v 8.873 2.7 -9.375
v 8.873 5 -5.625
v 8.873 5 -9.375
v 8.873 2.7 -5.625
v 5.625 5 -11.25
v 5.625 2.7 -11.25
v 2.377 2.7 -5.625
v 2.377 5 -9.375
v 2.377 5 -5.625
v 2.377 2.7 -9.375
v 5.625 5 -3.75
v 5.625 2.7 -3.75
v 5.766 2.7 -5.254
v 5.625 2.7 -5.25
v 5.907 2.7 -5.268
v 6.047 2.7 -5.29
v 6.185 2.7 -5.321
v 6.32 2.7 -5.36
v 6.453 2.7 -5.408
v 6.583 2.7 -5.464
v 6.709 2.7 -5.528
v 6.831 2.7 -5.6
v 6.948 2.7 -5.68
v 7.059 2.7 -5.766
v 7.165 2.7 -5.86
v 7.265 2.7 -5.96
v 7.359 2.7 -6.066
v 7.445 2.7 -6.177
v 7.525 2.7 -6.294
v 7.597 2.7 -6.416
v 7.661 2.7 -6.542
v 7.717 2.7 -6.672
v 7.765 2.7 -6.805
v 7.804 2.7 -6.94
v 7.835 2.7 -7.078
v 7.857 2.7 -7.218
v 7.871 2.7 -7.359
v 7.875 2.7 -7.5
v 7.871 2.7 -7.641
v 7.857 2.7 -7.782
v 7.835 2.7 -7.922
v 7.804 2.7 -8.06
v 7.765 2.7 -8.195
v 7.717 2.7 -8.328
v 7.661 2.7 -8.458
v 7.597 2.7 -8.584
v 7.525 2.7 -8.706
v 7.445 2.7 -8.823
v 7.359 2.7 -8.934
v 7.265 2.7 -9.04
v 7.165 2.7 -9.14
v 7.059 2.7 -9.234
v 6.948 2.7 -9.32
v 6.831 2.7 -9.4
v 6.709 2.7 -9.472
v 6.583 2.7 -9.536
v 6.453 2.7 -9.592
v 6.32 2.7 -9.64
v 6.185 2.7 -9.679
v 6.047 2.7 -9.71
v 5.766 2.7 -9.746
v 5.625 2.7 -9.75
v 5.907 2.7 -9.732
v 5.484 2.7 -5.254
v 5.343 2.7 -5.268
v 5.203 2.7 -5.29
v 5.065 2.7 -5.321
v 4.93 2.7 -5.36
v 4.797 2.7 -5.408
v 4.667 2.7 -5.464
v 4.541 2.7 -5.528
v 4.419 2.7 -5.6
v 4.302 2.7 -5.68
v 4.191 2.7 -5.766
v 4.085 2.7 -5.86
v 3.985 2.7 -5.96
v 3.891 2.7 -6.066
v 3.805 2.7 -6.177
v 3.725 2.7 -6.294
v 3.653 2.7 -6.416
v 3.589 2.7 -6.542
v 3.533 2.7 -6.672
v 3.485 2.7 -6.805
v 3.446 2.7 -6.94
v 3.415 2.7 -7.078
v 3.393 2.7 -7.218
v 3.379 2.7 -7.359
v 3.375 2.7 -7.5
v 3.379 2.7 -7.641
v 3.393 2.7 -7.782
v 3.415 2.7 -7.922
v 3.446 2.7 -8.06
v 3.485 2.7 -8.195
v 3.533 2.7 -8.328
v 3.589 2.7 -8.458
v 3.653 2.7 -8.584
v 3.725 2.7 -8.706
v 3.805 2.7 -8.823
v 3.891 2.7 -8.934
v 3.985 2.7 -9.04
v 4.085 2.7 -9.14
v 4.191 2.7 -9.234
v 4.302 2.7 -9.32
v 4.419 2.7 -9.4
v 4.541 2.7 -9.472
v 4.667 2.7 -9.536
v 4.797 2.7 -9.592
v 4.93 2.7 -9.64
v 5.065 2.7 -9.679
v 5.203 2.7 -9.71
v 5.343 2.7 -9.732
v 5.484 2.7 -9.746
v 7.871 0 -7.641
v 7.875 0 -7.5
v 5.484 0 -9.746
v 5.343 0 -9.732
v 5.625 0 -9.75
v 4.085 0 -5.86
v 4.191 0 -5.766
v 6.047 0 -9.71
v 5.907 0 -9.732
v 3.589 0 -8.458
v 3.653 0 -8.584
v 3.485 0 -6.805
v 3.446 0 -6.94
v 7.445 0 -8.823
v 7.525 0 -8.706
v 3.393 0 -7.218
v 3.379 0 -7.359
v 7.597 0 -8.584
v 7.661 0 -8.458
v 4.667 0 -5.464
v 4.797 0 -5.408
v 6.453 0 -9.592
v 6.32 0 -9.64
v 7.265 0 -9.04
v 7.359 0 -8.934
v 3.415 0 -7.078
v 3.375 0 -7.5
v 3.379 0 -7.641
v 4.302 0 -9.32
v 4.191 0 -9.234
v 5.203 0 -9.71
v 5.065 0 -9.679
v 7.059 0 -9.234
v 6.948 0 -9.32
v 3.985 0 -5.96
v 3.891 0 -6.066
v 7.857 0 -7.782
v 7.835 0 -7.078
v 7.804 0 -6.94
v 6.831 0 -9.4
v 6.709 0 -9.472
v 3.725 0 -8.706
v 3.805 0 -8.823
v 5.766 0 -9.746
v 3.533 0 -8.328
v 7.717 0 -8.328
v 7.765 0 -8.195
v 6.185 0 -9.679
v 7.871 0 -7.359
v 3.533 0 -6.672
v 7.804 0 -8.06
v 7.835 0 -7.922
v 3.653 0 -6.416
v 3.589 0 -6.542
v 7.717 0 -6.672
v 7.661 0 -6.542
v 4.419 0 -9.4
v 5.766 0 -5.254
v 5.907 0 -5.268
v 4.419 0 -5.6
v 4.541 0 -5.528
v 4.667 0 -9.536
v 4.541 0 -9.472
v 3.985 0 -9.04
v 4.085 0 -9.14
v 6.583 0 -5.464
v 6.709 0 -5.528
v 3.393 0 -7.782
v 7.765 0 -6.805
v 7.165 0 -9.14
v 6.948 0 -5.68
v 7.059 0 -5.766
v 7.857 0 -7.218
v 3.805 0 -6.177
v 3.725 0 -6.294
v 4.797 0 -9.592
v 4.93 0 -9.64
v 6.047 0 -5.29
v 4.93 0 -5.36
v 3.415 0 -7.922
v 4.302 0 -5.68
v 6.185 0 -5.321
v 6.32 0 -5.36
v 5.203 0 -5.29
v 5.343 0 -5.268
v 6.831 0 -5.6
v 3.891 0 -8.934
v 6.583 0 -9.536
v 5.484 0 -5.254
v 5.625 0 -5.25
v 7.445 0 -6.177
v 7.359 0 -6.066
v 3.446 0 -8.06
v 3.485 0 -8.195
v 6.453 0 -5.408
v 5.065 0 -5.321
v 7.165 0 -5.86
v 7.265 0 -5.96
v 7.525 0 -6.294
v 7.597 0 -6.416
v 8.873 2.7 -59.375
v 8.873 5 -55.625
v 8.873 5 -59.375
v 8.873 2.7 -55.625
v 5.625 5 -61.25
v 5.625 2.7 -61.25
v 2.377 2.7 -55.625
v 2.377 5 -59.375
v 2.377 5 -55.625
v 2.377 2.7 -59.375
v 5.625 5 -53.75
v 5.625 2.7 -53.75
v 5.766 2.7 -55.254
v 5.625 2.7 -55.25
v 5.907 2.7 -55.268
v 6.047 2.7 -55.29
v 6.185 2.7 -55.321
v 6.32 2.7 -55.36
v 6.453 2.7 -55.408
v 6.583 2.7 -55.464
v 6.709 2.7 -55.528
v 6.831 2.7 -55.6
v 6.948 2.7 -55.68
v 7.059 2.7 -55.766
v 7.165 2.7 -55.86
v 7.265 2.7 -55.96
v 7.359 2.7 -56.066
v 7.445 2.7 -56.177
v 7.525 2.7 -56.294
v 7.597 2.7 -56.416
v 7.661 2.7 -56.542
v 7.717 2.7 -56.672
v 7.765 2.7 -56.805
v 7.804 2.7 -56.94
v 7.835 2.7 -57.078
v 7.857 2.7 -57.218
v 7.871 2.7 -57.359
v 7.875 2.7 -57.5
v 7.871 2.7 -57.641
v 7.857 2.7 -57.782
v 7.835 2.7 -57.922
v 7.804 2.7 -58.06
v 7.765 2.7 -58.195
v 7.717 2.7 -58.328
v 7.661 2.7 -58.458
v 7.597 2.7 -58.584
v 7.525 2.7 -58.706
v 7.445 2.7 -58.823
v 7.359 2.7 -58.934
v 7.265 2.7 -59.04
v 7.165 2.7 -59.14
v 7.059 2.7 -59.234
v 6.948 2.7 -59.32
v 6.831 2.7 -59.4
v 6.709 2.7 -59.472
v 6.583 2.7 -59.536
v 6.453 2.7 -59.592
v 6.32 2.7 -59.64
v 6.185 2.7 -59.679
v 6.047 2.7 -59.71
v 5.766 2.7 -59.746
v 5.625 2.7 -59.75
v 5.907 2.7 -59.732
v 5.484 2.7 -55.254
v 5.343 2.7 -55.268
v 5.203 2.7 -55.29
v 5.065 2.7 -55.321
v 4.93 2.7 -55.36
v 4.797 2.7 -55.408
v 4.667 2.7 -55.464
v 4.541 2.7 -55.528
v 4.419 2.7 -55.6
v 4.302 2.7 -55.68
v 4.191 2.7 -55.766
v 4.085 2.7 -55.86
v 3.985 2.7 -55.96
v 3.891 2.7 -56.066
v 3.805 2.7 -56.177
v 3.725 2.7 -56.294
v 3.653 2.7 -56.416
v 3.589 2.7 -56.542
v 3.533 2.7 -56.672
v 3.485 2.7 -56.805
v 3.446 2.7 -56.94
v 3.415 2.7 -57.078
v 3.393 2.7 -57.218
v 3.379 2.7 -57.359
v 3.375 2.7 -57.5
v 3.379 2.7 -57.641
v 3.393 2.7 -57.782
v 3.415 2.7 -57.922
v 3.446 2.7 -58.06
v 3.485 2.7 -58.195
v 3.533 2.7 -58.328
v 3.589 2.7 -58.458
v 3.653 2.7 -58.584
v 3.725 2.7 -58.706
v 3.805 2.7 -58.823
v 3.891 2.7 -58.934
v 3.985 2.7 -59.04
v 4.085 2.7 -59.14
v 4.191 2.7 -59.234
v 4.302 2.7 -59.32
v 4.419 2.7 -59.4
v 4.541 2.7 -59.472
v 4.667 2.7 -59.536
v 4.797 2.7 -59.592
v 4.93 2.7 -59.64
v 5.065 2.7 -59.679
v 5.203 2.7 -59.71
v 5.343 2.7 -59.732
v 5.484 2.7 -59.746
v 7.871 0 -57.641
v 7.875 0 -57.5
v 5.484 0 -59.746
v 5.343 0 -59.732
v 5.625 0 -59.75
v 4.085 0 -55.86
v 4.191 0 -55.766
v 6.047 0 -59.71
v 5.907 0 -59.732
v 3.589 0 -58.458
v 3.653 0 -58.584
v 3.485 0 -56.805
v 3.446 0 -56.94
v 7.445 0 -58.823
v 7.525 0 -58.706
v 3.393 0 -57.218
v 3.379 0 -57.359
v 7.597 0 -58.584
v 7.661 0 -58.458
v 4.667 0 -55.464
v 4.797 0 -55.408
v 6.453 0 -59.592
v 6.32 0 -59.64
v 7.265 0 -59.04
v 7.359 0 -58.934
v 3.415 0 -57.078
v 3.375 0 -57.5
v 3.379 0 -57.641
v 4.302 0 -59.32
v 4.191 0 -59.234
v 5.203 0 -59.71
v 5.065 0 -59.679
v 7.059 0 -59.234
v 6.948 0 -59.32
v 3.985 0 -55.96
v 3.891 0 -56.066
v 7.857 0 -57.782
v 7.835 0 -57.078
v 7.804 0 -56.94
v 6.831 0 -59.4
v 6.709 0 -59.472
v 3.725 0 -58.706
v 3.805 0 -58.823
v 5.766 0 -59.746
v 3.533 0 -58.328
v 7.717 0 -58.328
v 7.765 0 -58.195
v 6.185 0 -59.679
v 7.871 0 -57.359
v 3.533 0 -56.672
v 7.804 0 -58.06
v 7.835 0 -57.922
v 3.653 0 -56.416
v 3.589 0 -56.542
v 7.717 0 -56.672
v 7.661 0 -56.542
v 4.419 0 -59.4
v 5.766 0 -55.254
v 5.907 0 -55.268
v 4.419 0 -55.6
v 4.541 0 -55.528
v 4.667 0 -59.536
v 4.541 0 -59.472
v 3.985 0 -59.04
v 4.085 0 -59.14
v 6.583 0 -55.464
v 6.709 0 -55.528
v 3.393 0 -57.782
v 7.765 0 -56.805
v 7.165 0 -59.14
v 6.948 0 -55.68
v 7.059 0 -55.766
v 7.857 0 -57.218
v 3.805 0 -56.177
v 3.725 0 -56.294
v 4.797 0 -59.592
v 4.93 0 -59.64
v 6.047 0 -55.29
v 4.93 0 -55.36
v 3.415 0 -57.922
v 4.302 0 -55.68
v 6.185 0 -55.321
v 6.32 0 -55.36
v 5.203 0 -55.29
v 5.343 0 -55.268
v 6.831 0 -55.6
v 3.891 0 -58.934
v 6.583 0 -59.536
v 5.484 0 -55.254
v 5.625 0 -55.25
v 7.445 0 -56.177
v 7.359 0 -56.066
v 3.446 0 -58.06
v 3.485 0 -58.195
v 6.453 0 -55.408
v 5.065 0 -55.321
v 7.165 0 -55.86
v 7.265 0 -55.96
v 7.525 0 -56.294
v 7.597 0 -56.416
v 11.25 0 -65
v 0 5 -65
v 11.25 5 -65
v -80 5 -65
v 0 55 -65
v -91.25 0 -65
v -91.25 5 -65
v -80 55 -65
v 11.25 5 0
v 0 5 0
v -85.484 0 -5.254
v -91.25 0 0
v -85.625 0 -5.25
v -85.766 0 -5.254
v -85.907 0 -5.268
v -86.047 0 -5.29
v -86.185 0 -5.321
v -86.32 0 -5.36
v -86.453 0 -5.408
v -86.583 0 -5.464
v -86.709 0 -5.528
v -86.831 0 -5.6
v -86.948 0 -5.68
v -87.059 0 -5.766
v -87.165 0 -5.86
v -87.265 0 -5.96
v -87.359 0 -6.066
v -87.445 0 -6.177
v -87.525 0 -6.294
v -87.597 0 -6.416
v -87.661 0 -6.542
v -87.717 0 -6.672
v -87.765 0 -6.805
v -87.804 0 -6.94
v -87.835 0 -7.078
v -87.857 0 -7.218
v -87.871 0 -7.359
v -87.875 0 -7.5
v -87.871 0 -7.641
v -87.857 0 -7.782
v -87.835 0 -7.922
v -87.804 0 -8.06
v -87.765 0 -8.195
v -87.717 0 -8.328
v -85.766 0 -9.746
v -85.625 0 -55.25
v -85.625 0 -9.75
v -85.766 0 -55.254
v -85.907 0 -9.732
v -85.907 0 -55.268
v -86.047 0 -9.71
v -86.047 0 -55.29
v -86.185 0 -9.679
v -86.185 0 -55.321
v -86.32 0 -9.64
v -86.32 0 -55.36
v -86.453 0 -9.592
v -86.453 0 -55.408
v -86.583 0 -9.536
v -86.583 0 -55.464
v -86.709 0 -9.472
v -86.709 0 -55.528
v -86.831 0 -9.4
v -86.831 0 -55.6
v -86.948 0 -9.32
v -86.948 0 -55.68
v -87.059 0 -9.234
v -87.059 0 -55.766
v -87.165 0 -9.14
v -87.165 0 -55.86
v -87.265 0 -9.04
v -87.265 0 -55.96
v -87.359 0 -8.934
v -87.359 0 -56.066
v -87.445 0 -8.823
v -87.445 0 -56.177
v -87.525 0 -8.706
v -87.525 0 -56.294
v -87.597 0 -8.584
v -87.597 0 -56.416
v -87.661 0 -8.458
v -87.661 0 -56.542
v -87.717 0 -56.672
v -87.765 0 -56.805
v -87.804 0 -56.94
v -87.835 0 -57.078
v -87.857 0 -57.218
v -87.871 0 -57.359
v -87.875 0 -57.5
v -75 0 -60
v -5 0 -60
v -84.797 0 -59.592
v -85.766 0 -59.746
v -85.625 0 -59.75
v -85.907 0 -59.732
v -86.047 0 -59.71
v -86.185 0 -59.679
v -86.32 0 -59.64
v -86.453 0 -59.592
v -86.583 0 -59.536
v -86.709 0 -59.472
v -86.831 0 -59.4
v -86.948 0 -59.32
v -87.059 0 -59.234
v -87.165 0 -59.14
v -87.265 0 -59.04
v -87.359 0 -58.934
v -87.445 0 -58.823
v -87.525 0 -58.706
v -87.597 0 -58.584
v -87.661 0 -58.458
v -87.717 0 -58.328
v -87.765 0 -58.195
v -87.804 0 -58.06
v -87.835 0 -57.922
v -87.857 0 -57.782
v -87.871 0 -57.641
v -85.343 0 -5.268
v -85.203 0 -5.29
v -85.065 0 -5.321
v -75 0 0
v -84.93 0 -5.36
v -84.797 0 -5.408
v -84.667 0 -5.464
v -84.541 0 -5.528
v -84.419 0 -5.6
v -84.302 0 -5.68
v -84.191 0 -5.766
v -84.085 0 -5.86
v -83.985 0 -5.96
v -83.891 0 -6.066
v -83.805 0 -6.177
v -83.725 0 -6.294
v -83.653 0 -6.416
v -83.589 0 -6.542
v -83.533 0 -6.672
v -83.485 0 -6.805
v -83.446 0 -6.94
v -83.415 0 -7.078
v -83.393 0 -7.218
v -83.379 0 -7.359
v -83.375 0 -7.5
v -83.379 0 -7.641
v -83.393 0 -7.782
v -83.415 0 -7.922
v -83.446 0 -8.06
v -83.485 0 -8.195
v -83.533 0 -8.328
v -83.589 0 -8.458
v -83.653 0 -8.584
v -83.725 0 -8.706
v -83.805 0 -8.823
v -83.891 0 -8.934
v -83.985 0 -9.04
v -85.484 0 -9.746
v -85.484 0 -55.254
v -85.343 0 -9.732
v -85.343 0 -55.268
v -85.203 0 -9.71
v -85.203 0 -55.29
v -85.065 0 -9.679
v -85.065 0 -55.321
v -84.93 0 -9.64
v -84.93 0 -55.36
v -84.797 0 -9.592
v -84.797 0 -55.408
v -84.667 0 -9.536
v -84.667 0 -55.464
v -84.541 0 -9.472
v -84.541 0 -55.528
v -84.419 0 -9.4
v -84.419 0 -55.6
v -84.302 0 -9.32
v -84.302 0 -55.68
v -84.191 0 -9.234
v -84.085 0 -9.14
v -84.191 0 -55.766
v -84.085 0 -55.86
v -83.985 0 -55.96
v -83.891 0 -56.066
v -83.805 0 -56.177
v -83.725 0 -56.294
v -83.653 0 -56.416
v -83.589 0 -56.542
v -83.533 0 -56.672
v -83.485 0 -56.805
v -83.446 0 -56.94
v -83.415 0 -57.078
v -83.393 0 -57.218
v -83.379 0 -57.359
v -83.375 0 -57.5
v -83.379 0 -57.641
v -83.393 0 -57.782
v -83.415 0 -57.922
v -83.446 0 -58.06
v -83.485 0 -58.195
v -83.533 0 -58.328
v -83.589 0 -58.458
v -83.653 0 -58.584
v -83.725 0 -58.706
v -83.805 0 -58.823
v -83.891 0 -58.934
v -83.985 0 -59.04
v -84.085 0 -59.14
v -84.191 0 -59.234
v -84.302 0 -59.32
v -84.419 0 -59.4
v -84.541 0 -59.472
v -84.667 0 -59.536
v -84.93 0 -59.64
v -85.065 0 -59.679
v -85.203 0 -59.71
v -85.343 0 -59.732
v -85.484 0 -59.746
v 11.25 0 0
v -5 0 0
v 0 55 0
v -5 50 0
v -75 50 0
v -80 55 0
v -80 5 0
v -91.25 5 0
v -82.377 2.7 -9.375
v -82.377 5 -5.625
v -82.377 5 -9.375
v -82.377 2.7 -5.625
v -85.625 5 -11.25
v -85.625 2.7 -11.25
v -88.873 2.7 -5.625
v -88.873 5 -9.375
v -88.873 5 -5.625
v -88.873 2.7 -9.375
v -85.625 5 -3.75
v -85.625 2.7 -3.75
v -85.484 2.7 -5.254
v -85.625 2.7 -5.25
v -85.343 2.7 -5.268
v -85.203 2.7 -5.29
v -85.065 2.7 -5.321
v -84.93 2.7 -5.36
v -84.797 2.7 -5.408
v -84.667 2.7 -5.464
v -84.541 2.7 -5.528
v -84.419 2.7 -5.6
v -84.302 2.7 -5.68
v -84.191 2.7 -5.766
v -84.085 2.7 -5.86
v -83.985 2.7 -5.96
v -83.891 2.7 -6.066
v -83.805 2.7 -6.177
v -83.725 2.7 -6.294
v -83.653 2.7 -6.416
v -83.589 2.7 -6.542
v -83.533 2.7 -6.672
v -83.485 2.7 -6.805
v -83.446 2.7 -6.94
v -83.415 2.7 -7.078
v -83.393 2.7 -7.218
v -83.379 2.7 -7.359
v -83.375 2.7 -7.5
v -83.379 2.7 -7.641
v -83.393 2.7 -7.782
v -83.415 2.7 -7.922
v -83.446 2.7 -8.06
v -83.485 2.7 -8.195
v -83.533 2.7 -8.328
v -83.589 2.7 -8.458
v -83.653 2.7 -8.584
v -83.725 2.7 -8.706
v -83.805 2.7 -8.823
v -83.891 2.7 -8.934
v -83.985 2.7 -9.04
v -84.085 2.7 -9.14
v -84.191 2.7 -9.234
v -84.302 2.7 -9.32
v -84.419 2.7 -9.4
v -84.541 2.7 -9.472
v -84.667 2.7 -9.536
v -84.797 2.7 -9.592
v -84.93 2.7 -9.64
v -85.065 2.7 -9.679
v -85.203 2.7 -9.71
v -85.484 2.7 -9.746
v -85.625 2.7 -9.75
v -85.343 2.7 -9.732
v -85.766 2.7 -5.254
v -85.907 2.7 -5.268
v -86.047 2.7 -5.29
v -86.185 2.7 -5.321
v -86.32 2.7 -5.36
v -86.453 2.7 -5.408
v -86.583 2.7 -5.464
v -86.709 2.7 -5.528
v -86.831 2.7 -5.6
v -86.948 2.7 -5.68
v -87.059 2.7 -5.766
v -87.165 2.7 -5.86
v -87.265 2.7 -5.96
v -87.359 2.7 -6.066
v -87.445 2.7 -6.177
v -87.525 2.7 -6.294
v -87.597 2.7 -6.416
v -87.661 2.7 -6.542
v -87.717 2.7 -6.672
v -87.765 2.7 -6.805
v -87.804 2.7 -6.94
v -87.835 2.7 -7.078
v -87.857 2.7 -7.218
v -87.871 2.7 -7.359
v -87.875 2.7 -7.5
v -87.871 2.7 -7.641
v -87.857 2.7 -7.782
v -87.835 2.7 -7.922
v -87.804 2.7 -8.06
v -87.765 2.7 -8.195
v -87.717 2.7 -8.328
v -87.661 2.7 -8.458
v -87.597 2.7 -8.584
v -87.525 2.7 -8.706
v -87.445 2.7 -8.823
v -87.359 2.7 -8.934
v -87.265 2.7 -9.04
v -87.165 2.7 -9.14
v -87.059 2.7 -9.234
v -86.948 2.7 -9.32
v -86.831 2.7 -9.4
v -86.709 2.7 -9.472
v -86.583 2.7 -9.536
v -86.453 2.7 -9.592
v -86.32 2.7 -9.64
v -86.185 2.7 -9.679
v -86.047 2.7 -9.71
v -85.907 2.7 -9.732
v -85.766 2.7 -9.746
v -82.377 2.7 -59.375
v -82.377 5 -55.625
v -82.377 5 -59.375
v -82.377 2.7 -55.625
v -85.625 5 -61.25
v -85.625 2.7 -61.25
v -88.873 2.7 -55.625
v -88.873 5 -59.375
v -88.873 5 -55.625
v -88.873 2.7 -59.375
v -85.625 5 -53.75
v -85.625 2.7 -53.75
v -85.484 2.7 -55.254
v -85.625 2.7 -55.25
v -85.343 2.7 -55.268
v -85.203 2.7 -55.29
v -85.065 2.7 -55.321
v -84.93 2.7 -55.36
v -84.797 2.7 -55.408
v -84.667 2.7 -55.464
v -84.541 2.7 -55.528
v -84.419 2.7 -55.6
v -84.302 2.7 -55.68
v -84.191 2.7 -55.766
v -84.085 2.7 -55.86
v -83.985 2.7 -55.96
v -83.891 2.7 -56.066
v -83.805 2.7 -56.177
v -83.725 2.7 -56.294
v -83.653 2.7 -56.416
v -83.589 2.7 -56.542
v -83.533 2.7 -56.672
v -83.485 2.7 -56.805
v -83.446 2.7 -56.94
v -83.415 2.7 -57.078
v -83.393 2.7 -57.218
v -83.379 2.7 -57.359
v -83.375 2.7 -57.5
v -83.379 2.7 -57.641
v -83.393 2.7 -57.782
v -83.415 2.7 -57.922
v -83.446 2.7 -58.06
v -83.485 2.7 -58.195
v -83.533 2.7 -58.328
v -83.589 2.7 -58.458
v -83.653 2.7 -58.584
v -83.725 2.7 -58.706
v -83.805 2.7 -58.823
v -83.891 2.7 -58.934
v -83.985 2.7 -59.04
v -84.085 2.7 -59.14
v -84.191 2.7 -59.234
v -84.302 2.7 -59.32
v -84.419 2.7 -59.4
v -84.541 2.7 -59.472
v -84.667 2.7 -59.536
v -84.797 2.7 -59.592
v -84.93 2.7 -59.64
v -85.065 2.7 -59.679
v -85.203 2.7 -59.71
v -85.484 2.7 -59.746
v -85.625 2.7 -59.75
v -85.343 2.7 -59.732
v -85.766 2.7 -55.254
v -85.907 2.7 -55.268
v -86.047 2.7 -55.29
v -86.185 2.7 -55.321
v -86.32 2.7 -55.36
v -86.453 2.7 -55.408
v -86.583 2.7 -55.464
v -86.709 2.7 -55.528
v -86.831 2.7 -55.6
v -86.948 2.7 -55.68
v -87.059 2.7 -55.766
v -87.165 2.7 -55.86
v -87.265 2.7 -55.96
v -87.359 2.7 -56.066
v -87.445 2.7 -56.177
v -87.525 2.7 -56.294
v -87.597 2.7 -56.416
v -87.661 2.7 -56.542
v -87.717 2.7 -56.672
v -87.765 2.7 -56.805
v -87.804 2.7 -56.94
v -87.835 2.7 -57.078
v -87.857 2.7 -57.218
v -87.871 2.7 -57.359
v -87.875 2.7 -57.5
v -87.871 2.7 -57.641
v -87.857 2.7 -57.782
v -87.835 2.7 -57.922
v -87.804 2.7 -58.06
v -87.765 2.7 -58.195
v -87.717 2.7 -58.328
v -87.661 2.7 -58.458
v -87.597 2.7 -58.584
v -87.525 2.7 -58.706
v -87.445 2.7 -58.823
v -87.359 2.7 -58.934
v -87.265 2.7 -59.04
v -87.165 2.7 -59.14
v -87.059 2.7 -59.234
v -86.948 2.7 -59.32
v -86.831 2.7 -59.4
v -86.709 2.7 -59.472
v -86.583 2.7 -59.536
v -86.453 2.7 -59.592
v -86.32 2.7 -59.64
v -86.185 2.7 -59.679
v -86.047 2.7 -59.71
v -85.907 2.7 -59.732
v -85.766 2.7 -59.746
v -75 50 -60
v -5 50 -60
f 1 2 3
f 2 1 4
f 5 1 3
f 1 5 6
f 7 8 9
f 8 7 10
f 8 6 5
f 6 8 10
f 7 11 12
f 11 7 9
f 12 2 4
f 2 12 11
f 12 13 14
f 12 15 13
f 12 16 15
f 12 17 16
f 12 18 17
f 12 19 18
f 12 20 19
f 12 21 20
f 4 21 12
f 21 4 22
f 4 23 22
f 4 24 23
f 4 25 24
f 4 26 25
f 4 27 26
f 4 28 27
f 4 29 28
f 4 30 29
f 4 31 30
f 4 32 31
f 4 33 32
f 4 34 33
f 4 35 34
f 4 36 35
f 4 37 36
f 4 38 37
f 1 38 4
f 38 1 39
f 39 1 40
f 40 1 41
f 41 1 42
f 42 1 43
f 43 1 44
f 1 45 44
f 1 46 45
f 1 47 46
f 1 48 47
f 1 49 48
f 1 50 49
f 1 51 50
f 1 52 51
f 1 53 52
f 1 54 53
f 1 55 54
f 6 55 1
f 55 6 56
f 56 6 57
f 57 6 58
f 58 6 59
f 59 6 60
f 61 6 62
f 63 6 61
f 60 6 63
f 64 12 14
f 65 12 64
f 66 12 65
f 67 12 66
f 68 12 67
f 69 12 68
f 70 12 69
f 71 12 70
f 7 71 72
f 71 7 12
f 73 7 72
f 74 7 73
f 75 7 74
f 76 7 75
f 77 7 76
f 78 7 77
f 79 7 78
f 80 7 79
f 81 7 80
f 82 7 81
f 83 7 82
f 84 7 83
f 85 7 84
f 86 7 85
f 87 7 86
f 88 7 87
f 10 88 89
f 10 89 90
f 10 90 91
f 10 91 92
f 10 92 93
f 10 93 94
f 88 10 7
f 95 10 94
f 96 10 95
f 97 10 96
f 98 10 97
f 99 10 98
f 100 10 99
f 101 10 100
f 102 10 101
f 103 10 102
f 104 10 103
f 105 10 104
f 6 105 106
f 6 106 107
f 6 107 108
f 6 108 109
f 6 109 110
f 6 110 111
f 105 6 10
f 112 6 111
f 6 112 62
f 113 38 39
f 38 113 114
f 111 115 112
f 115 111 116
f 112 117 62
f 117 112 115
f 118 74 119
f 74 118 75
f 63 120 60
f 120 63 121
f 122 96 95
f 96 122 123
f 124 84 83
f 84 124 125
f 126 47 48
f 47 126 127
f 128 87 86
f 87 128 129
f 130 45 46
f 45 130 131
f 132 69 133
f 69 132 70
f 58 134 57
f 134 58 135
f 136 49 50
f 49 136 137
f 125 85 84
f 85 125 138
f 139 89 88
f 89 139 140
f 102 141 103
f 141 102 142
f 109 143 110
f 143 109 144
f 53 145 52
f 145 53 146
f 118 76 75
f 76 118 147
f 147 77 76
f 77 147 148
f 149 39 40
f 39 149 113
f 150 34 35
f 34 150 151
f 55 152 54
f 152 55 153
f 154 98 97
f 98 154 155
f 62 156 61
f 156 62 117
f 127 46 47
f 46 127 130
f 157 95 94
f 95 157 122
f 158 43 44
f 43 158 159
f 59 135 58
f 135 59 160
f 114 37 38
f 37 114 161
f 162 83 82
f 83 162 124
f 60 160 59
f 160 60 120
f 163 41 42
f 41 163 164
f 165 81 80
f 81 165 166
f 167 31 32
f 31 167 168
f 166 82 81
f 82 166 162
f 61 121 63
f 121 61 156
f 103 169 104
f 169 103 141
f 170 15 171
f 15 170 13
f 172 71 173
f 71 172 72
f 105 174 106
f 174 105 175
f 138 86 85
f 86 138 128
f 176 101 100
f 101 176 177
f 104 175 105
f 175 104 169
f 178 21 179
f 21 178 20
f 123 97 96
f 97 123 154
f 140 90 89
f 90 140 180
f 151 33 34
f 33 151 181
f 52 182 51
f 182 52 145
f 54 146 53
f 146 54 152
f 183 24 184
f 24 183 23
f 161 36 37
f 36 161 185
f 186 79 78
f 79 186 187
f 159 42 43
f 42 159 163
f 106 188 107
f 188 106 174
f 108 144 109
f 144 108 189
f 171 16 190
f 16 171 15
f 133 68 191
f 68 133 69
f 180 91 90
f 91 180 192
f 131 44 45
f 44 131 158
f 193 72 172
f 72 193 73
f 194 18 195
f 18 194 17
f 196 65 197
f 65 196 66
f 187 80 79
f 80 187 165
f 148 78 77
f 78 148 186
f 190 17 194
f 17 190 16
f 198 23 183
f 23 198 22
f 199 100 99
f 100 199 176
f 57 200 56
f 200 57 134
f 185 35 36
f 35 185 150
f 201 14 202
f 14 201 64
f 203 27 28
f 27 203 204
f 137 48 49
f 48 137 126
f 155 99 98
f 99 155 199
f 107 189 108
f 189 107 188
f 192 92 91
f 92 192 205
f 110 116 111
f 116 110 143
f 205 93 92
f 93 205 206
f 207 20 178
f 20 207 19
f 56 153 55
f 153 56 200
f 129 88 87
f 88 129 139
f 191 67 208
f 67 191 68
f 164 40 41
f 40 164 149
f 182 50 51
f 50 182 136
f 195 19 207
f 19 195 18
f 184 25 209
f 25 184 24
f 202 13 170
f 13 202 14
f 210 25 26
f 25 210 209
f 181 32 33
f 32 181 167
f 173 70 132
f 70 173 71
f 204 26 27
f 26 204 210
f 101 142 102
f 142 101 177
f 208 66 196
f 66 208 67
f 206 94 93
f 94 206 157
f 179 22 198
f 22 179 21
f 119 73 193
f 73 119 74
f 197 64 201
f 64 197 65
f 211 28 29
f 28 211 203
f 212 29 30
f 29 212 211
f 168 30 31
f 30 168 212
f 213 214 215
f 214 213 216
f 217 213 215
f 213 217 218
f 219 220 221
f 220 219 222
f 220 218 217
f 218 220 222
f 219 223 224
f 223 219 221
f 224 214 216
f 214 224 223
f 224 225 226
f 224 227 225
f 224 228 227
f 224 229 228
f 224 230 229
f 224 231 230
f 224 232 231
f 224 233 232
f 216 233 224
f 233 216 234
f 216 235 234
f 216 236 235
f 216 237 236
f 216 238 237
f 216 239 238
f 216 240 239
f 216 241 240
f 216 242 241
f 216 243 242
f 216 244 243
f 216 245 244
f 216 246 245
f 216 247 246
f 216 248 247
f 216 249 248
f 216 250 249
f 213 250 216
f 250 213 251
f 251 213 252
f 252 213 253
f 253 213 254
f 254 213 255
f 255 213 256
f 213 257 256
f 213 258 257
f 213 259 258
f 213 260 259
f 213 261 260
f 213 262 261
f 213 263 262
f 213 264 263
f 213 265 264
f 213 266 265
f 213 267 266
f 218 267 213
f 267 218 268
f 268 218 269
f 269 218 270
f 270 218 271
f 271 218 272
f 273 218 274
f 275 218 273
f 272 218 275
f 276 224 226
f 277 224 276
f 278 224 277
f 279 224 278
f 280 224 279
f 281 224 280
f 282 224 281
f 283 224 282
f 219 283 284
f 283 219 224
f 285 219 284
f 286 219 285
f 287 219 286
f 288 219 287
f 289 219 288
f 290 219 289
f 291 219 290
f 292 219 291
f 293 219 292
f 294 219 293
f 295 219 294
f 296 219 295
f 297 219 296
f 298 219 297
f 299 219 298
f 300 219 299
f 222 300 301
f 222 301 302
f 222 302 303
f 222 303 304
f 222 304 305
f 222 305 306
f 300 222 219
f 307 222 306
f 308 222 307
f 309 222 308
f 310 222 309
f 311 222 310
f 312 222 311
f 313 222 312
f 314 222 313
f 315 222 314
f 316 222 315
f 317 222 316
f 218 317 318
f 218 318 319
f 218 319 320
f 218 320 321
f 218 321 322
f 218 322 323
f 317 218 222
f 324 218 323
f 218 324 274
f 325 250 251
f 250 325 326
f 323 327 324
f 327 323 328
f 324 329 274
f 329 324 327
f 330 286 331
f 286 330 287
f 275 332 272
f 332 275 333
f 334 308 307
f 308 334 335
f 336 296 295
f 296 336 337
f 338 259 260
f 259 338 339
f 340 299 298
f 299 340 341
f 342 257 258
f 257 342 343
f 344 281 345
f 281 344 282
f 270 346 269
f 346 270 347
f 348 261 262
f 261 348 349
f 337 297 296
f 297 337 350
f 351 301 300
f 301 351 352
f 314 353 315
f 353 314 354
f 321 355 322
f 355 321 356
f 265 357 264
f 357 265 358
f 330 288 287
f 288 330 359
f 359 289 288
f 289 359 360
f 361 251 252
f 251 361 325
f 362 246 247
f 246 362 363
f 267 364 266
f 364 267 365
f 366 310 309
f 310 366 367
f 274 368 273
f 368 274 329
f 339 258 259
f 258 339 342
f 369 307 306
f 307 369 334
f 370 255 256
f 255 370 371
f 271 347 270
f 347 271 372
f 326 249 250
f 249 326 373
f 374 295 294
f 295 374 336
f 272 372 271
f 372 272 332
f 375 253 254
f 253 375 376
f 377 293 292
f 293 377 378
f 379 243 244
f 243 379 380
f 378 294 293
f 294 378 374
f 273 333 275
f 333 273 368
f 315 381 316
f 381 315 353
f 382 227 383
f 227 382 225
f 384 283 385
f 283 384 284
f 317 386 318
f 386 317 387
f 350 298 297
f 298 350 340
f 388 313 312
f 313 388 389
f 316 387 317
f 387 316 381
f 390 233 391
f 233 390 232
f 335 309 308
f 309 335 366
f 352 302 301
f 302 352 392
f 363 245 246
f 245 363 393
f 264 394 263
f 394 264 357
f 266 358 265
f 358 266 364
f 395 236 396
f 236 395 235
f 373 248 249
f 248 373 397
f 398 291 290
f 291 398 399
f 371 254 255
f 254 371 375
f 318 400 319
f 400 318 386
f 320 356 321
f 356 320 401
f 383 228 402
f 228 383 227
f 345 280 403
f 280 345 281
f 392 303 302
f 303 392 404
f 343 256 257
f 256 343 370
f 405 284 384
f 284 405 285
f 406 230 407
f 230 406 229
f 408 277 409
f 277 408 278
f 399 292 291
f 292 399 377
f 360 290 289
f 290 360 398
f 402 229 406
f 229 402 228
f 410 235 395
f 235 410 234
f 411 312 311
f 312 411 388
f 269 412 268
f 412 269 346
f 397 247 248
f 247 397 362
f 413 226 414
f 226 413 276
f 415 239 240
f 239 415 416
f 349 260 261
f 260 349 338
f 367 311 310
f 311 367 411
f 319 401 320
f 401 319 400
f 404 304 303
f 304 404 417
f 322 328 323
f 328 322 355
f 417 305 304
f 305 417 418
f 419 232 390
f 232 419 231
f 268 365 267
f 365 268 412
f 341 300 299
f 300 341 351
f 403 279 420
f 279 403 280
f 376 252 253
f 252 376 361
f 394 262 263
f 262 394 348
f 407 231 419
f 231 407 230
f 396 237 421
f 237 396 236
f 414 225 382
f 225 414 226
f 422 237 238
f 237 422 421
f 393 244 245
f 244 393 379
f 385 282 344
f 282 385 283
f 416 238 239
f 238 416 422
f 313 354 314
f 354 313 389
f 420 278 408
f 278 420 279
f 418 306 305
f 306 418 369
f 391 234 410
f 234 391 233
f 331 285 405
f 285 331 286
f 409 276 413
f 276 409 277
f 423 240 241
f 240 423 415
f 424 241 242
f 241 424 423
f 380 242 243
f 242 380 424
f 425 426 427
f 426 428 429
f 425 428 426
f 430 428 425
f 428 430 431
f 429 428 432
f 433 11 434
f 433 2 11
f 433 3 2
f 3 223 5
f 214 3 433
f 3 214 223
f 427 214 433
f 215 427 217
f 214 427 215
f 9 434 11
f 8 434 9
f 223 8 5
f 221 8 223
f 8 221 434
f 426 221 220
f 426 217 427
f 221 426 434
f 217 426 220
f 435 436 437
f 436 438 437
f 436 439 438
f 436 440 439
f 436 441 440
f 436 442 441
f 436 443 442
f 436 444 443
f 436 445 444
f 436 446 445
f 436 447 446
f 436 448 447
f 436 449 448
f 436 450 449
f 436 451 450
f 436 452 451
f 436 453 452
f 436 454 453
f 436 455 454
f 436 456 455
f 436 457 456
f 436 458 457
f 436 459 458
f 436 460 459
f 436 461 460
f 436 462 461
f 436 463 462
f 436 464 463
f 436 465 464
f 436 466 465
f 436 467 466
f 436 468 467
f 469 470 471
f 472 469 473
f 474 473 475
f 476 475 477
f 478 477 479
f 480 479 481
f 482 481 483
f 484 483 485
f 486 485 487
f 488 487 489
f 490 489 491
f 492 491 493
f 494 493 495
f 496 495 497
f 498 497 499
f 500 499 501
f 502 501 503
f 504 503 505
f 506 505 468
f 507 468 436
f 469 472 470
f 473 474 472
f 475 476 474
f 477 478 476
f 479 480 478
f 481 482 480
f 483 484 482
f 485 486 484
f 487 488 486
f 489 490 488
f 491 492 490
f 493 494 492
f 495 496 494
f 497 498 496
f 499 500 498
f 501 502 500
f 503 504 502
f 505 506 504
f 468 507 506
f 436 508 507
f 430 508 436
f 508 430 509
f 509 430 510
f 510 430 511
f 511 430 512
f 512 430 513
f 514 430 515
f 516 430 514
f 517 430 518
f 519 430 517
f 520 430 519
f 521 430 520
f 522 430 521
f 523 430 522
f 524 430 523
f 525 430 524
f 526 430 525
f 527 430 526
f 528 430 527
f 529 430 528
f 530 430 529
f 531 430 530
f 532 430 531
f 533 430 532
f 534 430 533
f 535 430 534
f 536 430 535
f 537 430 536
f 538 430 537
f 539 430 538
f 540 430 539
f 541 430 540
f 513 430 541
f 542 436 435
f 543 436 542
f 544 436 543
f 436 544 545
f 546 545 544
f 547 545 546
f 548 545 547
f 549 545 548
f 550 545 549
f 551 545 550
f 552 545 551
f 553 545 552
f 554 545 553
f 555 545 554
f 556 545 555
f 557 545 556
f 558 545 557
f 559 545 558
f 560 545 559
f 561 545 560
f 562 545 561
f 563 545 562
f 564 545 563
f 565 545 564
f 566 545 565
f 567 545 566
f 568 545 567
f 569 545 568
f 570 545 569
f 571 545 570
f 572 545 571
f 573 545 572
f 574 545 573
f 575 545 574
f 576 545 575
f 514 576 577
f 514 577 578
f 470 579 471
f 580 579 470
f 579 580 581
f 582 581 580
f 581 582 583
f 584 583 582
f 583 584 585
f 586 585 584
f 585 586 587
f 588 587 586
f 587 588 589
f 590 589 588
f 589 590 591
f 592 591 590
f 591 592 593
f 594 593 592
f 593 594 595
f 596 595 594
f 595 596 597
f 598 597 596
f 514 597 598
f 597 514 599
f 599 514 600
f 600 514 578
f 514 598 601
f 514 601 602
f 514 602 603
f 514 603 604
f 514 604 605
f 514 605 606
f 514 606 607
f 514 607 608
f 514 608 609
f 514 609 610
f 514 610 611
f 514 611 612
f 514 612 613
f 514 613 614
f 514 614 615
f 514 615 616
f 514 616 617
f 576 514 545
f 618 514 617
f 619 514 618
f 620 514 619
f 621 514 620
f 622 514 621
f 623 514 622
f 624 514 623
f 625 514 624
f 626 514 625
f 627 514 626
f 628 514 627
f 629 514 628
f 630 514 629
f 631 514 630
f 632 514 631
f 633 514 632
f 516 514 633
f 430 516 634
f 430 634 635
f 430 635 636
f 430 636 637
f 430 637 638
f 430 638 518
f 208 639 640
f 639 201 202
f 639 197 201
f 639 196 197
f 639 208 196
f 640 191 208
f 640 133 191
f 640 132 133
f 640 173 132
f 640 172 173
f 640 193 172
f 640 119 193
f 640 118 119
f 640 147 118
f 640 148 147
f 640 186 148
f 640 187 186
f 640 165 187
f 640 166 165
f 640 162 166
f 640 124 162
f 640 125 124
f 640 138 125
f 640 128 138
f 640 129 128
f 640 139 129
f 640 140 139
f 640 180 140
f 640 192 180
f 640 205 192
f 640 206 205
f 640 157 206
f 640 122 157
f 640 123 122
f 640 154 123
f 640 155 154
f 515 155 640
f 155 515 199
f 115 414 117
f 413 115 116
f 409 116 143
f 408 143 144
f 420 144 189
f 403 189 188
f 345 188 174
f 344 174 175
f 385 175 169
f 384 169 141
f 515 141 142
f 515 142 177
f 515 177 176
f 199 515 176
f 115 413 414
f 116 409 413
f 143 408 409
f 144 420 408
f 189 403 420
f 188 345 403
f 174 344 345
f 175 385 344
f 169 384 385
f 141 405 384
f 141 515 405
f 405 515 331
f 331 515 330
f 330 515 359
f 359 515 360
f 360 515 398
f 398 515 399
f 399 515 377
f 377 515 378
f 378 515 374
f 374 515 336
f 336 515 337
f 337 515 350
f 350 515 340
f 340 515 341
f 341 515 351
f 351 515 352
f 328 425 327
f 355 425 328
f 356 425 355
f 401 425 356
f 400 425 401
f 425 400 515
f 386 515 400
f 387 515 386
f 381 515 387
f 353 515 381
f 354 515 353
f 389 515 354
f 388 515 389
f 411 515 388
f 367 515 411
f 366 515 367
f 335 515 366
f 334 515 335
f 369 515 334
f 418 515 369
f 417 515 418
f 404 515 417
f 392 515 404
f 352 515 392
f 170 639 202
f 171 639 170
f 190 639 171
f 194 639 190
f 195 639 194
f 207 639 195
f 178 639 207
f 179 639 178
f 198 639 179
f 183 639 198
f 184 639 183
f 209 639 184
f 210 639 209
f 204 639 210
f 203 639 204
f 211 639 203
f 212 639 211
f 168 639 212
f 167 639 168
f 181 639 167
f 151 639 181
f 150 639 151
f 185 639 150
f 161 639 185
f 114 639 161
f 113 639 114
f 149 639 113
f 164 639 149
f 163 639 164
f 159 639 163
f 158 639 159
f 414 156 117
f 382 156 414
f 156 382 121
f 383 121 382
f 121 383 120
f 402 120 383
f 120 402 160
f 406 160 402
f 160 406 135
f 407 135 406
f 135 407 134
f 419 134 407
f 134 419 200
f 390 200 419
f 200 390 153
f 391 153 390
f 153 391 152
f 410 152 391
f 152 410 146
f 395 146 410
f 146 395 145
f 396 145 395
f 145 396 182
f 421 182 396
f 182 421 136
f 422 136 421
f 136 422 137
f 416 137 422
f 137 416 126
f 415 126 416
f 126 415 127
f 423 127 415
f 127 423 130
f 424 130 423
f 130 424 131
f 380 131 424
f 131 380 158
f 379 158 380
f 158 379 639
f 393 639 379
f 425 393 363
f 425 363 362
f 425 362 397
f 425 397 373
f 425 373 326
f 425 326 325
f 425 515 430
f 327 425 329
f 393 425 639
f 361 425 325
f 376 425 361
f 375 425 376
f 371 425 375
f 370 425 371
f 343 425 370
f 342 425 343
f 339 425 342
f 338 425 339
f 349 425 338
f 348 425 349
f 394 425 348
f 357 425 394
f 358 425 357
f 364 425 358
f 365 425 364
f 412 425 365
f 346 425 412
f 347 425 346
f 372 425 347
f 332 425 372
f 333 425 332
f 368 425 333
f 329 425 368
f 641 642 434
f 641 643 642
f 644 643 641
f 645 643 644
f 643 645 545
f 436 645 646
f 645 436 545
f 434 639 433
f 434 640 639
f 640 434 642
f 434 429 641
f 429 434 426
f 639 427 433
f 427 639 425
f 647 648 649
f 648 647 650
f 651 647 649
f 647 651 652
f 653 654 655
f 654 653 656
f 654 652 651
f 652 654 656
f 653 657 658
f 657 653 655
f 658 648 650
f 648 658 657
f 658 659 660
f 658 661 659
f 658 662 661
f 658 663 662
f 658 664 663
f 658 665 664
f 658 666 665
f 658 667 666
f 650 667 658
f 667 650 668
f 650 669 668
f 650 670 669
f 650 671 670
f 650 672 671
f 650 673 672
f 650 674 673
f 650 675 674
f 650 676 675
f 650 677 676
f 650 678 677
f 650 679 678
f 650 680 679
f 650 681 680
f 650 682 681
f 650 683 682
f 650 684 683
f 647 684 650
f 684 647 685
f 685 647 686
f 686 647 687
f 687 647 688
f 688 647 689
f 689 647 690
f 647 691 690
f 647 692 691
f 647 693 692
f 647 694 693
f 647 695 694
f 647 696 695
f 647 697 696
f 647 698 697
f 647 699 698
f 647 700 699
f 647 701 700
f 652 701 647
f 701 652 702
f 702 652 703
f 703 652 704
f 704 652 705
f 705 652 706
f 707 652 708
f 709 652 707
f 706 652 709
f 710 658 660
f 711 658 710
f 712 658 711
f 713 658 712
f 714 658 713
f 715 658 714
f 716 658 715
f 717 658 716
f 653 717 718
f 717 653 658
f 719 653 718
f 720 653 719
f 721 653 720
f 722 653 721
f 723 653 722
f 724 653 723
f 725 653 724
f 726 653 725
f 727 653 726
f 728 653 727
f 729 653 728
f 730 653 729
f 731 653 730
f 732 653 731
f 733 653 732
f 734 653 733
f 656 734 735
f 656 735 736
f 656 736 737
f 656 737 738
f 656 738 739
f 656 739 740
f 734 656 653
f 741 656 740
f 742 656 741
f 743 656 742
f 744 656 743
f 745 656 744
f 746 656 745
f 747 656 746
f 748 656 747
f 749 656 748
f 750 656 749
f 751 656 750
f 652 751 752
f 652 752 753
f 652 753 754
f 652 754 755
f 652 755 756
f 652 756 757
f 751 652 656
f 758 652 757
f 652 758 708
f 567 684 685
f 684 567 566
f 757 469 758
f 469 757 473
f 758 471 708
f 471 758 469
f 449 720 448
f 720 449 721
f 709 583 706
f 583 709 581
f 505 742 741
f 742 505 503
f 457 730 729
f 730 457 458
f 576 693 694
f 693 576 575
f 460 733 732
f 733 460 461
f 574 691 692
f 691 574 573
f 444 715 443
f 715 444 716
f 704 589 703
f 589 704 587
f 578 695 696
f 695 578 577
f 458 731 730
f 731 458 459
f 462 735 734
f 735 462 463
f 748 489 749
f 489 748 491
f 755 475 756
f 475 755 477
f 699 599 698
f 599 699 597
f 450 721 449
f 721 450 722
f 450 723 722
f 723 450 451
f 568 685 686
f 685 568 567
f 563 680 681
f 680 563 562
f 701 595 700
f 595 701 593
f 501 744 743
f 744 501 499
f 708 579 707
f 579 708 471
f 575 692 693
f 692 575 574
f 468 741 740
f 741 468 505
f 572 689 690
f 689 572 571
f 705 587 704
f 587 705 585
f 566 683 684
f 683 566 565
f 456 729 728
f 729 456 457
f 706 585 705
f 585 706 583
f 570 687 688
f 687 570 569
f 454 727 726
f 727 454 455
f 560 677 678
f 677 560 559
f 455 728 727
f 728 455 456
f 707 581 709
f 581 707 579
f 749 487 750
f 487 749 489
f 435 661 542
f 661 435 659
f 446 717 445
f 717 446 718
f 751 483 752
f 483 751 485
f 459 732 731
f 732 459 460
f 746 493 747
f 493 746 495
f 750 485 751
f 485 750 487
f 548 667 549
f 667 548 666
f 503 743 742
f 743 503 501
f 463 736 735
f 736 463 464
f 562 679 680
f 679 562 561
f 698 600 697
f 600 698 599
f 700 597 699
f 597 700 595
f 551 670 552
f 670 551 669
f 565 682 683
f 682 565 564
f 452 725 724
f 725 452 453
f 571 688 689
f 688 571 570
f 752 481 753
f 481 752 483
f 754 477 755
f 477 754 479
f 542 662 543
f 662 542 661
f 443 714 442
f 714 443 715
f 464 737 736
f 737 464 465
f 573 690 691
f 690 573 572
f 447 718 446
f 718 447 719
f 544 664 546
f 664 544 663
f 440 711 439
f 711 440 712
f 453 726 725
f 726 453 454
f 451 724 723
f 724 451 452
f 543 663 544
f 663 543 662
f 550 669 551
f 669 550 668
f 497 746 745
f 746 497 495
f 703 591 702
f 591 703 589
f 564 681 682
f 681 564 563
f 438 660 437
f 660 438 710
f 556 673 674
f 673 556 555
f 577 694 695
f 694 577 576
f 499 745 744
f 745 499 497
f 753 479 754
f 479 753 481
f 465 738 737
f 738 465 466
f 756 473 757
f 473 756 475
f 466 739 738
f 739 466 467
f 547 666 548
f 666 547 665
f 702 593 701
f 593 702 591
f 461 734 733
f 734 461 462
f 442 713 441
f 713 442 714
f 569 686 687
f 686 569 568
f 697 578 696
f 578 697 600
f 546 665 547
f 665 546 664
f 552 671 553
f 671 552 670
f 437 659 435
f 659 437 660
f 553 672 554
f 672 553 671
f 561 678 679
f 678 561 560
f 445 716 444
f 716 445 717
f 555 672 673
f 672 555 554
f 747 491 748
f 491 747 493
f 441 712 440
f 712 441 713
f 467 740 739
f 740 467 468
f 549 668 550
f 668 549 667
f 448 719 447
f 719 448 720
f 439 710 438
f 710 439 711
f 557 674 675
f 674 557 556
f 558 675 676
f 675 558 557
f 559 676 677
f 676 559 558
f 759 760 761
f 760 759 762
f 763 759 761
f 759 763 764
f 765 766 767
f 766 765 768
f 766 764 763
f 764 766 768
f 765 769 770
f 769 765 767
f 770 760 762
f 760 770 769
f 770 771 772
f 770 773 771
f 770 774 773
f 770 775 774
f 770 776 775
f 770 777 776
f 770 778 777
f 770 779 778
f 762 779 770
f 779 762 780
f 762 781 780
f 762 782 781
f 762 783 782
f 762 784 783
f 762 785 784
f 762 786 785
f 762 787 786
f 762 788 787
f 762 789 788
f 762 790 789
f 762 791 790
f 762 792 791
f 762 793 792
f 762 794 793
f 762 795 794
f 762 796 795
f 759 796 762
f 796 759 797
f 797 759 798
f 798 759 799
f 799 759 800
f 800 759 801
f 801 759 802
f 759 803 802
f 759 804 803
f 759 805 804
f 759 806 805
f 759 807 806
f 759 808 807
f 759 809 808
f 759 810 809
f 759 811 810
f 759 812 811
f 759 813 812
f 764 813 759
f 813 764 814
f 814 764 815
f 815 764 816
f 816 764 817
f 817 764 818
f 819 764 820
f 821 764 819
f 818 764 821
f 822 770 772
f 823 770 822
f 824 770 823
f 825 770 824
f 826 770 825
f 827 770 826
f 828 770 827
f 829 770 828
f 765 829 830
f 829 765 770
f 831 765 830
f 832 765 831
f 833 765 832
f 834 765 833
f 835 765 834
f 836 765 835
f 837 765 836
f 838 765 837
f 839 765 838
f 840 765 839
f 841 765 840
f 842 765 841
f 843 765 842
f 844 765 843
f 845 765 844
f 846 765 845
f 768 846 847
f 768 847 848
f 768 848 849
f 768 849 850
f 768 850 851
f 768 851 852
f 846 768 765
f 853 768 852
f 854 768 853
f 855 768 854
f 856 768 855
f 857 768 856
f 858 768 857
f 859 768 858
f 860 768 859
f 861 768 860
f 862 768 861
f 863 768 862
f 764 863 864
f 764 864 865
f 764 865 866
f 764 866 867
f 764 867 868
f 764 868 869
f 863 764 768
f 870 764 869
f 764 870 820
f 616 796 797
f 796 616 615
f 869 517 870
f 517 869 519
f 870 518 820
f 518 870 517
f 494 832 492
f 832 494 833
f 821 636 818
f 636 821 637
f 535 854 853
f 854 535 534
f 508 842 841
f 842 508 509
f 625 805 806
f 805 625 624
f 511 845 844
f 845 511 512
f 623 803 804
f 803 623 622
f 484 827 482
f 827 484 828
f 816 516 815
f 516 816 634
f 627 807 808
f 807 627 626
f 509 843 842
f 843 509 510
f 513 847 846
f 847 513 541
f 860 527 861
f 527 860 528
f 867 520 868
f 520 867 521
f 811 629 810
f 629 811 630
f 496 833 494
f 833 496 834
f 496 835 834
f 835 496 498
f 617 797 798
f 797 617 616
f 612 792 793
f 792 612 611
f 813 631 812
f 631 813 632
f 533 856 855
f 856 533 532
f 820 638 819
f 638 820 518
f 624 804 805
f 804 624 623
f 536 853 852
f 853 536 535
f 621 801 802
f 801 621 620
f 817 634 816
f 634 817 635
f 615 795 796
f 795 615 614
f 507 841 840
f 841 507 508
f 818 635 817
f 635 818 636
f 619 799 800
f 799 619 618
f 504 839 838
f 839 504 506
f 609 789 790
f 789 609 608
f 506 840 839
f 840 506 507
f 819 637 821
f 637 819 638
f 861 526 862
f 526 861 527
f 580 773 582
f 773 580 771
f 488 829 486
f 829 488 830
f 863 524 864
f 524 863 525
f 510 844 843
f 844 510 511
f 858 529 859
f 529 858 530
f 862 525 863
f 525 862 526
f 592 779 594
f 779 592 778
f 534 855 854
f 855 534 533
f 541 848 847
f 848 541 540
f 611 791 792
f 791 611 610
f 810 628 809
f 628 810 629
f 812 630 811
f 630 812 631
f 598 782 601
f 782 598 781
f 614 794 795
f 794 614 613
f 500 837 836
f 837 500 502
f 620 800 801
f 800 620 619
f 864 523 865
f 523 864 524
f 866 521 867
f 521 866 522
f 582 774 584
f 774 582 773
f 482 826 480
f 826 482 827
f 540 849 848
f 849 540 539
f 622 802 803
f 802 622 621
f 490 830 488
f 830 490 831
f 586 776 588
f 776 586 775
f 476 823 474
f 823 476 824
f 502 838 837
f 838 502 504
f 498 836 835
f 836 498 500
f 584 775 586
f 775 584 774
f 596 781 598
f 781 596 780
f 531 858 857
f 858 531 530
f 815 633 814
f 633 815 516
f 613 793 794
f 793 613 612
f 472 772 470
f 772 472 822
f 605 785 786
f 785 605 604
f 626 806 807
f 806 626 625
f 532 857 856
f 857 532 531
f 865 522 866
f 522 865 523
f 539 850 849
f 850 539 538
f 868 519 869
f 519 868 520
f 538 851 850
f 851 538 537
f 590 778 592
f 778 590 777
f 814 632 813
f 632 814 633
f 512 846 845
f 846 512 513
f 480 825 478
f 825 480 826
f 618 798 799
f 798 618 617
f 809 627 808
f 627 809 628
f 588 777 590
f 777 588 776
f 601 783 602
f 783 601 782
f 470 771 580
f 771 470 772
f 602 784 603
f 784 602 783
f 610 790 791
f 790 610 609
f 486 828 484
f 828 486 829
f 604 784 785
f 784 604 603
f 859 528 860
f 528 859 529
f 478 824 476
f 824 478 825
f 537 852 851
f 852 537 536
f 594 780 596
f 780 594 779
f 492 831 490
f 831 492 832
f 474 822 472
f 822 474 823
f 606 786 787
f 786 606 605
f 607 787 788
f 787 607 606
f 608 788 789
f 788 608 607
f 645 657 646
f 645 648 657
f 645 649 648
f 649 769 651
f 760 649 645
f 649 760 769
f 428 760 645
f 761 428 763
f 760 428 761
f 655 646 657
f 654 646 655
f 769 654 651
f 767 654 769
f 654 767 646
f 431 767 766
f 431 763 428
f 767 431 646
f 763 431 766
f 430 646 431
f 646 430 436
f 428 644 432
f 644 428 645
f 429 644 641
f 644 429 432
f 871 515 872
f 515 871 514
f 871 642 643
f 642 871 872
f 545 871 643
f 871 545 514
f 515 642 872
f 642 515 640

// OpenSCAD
// Flush holder
// Copyright (C) 2016  Andre-Patrick Bubel <code@andre-bubel.de>
//
// This program is free software: you can redistribute it and/or modify
// it under the terms of the GNU General Public License as published by
// the Free Software Foundation, either version 3 of the License, or
// (at your option) any later version.
// 
// This program is distributed in the hope that it will be useful,
// but WITHOUT ANY WARRANTY; without even the implied warranty of
// MERCHANTABILITY or FITNESS FOR A PARTICULAR PURPOSE.  See the
// GNU General Public License for more details.
// 
// You should have received a copy of the GNU General Public License
// along with this program.  If not, see <http://www.gnu.org/licenses/>.
//
// This work is also licensed under a Creative Commons
// Attribution-ShareAlike 4.0 International License.

screw_hole_diameter = 4.5;

nut_width = 7.5;
nut_height = 3.2;

layer_height = 0.3;

case_inner_width = 60;
case_inner_height = 50;
case_inner_length = 70;

wall_thickness = 5;
fastening_plate_height = 5;

/* [Hidden] */
// how much puncher parts should overlap to avoid zero thickness leftovers
punch = 1000;

case_inner_dim_punch = [case_inner_width+punch, case_inner_length, case_inner_height+punch];

case_outer_width = case_inner_width + wall_thickness;
case_outer_height = case_inner_height + wall_thickness;
case_outer_length = case_inner_length + 2*wall_thickness;

case_outer_dim = [case_outer_width, case_outer_length, case_outer_height];

fastening_plate_length = 3/2 * nut_width;
fastening_plate_width = case_outer_width;
fastening_plate_height = nut_height + layer_height * 6;

fastening_plate_dim = [fastening_plate_width, fastening_plate_length, fastening_plate_height];

module hole_puncher() {
    union() {
        cylinder(punch, d = nut_width, $fn=6);
        translate([0,0,-punch+1])
        cylinder(punch, d = screw_hole_diameter);
    }
}

module fastening_plate() {
    difference() {
        cube(fastening_plate_dim);
        translate([nut_width, fastening_plate_length/2, layer_height * 9])
        hole_puncher();
        translate([fastening_plate_width - nut_width, fastening_plate_length/2, layer_height * 9])
        hole_puncher();        
    }
};

$fn = 100;

rotate([0,90,90])
difference() {
    union() {
        translate([0,-fastening_plate_length,0])
        fastening_plate();
        translate([0,case_outer_length,0])
        fastening_plate();    
        cube(case_outer_dim);
    }
    translate([-punch, wall_thickness, -punch])
    cube(case_inner_dim_punch);
}
